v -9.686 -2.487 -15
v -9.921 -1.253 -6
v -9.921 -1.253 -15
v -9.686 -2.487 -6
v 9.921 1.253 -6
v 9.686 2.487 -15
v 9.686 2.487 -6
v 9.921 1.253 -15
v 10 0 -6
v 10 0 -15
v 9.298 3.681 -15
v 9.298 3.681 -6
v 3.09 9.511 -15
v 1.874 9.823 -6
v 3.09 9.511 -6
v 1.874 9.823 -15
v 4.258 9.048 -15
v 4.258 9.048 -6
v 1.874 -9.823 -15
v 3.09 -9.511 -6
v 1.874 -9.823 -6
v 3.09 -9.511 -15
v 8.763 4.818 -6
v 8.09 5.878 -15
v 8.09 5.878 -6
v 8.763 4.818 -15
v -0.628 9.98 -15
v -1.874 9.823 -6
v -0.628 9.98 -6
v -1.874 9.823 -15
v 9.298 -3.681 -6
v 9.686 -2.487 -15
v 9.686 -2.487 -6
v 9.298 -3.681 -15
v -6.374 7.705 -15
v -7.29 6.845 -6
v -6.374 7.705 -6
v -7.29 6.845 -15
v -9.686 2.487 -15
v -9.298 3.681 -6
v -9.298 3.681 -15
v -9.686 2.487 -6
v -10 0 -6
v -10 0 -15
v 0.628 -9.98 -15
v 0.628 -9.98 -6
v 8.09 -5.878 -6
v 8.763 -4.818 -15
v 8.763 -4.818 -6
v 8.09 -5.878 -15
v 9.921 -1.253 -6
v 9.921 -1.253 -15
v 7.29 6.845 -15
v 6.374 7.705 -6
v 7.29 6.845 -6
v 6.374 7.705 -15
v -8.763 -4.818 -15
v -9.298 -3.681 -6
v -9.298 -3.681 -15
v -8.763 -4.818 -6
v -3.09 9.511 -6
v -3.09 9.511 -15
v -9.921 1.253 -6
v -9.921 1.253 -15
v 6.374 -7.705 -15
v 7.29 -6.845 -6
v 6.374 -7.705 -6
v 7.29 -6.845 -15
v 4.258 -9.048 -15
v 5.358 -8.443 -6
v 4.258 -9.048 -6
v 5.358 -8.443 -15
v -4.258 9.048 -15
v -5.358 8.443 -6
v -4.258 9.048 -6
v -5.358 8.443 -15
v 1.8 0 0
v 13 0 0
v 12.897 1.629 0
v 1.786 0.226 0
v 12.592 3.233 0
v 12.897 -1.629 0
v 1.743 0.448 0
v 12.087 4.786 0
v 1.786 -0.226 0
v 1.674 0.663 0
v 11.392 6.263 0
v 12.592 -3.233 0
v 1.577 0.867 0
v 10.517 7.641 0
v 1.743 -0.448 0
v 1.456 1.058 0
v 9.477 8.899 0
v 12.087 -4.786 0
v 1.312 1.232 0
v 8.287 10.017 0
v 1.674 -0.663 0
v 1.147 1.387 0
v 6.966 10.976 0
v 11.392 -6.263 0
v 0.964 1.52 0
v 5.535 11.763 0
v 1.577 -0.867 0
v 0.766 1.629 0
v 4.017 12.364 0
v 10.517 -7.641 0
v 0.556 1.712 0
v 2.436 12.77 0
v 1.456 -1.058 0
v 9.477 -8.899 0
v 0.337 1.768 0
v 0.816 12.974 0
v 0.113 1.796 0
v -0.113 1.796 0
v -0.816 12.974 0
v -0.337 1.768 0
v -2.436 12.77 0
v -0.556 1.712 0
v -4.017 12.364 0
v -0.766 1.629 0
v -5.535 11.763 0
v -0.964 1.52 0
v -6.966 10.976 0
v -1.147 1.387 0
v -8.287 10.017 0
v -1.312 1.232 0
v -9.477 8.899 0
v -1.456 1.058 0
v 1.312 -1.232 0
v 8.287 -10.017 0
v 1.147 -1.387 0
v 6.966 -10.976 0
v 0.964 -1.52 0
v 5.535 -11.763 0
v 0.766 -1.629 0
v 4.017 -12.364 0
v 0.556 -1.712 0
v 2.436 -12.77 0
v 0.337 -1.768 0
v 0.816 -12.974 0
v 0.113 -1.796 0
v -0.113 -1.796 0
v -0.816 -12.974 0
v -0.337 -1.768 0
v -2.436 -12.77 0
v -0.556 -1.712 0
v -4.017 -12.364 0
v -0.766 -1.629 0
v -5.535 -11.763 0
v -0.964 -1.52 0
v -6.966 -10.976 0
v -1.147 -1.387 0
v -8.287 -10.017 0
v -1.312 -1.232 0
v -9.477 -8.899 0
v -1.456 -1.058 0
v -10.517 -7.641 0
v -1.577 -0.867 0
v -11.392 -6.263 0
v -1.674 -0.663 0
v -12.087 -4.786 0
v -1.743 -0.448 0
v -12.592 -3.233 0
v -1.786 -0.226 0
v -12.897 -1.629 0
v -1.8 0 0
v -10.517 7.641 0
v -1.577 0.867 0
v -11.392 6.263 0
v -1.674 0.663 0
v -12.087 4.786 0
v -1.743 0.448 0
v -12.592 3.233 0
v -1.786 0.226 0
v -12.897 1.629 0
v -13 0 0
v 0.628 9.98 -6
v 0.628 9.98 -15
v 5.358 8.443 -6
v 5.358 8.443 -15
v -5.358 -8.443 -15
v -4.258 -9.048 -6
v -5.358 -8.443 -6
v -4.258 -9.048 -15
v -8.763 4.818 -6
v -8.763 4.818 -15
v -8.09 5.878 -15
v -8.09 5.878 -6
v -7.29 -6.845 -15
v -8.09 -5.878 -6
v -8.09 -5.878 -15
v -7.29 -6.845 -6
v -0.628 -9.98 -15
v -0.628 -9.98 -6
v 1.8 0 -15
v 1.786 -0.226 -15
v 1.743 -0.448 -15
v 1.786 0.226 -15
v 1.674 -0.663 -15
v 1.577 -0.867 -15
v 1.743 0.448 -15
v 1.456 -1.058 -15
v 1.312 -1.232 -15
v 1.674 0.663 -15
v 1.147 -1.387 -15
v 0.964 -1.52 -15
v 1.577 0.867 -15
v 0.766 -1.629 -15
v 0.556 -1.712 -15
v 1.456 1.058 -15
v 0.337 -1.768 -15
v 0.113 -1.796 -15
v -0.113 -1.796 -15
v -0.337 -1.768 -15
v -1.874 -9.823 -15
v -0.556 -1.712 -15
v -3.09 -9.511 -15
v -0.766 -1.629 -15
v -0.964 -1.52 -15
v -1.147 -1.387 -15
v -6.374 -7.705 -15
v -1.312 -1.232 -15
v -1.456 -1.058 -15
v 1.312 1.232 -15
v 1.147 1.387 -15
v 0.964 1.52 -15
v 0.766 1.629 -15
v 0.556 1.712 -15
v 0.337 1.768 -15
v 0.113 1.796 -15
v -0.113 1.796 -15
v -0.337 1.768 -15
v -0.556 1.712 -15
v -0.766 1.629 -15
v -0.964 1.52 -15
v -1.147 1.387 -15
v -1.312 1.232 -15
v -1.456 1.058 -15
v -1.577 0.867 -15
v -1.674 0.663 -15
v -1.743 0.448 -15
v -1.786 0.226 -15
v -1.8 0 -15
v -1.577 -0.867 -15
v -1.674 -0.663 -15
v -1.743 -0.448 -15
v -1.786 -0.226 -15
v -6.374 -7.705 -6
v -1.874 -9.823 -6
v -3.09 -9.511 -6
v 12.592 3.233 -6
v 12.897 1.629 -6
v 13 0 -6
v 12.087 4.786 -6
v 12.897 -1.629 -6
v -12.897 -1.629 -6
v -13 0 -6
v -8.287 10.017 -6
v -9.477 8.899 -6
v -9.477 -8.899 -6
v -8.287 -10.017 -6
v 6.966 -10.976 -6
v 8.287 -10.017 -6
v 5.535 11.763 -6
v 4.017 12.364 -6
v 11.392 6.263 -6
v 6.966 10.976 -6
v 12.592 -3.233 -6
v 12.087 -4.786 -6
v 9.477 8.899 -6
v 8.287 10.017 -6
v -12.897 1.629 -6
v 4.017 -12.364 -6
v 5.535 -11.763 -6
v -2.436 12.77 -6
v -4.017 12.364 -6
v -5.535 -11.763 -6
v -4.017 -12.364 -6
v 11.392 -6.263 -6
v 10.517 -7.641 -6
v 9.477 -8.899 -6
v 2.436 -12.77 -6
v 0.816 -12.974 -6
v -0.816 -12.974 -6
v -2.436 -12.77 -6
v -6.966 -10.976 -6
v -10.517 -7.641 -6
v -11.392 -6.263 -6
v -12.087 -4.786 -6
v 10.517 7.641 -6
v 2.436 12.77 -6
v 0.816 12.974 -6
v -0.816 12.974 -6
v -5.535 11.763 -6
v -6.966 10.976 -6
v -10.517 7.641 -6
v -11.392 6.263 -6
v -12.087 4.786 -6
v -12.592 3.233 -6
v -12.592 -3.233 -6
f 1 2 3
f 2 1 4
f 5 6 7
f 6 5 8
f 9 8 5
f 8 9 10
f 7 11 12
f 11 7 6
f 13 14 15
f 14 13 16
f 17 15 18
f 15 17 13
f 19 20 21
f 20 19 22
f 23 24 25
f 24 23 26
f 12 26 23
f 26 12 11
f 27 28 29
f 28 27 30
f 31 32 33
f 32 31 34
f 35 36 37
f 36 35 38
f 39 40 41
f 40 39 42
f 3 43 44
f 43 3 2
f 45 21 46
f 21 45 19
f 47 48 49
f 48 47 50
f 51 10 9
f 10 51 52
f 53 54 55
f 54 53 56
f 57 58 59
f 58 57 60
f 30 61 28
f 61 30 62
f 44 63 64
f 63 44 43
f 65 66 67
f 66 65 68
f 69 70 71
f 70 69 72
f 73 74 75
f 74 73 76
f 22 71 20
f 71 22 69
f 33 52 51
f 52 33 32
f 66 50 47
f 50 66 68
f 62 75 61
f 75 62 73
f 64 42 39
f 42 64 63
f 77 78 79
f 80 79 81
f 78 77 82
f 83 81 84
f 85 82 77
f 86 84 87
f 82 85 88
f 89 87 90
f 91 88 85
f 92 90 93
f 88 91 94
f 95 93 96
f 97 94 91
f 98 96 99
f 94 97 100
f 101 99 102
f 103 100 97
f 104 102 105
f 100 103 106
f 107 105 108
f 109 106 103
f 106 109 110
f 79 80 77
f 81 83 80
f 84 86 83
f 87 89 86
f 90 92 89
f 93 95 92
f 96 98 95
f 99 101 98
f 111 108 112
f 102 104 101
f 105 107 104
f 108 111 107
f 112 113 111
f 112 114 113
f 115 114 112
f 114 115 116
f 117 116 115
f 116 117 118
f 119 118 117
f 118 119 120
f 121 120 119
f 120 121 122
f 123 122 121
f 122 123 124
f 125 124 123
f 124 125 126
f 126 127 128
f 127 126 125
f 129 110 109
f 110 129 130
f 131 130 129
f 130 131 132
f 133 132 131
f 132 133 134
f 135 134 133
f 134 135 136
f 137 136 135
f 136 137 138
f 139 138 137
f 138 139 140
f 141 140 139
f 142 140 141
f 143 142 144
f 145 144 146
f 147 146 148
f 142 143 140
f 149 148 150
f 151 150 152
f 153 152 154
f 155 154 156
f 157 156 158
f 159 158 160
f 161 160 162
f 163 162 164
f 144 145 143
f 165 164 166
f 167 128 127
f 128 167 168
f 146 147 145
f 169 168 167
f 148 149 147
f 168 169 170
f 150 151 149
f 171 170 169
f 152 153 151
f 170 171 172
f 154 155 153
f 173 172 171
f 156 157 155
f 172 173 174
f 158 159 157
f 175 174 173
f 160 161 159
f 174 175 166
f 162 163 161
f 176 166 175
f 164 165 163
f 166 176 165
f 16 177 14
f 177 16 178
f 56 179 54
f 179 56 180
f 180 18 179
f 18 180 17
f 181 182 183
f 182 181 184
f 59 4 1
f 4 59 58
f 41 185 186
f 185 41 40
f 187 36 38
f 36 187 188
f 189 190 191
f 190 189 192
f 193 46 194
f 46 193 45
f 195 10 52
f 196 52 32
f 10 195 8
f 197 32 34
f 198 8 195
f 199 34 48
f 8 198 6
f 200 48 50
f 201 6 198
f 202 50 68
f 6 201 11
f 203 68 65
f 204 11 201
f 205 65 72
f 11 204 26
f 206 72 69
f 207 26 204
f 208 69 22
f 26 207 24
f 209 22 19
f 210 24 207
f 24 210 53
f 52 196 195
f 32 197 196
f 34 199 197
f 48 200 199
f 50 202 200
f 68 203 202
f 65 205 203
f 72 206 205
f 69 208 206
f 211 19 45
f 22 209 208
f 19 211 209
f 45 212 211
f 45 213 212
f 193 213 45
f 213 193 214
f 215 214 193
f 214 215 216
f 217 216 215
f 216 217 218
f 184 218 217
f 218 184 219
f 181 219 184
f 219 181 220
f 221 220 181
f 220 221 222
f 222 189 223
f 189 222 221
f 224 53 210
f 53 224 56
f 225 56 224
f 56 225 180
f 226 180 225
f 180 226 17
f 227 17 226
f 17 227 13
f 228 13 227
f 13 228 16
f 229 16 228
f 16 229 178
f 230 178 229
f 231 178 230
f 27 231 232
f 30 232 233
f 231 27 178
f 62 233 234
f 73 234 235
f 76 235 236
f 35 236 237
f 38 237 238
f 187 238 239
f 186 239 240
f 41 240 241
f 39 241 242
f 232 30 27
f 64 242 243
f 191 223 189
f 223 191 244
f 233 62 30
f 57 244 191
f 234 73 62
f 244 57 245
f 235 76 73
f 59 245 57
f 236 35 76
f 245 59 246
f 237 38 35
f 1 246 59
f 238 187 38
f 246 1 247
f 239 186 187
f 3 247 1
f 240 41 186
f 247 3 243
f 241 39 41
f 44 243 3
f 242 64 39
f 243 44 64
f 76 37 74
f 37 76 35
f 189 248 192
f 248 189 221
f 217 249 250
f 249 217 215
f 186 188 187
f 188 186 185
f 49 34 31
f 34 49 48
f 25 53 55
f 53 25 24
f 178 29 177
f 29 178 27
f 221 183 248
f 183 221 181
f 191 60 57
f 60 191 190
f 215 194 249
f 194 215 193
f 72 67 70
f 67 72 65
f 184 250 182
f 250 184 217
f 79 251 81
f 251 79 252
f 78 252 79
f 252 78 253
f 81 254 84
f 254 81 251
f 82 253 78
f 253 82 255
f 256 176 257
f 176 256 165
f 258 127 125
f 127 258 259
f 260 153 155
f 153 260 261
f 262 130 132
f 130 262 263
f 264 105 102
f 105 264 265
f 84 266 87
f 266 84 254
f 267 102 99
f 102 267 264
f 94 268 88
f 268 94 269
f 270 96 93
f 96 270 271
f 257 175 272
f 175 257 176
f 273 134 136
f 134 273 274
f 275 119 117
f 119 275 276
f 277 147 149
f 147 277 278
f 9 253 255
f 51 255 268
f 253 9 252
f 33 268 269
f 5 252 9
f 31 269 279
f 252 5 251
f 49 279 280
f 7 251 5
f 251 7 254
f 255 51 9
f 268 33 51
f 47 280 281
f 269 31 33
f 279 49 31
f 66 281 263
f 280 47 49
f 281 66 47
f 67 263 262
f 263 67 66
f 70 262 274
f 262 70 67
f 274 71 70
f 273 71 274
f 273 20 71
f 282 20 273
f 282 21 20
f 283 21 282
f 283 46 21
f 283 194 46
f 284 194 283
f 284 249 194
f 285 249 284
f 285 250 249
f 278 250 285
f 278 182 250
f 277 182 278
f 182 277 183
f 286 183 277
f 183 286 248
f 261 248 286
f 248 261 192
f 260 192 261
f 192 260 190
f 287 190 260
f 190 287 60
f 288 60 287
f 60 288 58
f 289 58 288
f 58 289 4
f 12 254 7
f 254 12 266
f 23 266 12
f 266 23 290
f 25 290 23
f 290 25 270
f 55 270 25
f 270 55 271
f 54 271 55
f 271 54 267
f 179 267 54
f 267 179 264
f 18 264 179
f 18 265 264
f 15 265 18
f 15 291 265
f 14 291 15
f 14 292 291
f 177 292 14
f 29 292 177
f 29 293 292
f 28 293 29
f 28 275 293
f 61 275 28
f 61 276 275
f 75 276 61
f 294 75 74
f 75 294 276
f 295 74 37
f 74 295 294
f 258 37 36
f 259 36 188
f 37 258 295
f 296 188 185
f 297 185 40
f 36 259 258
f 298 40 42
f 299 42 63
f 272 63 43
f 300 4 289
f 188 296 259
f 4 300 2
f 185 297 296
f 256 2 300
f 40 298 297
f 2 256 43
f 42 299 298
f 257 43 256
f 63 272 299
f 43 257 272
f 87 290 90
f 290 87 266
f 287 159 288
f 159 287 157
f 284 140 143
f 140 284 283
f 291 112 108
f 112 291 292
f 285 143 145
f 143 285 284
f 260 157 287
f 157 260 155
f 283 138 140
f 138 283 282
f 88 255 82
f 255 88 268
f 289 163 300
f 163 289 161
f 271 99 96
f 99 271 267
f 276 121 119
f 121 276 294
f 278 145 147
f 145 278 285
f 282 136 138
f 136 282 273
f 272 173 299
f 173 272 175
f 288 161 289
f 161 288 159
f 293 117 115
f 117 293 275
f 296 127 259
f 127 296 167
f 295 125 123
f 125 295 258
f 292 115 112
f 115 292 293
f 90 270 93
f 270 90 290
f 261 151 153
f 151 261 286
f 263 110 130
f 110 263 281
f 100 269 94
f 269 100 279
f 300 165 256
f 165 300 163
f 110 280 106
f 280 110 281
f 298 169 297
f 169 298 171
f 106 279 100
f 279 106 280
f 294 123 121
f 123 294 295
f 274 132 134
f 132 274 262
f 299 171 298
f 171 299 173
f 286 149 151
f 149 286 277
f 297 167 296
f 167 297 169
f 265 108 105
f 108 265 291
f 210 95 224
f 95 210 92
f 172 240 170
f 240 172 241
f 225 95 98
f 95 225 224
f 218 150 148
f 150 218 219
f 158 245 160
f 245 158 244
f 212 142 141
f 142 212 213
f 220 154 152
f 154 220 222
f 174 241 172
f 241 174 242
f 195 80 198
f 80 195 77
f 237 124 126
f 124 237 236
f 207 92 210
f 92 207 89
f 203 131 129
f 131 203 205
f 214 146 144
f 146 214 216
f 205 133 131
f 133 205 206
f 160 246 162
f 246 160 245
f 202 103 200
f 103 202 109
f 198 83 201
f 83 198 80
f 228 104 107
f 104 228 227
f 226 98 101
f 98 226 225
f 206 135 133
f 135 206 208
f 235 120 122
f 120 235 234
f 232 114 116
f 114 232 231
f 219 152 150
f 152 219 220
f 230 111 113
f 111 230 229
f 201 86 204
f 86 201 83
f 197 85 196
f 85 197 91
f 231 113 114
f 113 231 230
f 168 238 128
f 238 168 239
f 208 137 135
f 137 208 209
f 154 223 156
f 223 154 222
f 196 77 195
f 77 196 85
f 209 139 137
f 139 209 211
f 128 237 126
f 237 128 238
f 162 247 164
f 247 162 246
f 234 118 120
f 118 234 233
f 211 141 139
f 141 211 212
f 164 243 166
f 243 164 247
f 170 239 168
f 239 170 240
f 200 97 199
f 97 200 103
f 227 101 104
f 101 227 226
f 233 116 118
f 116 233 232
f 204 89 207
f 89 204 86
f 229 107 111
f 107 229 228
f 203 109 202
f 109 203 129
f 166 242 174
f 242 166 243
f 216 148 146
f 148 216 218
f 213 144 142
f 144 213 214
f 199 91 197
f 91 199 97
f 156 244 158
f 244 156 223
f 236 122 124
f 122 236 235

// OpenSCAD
$fn = 50;


difference() {
	union() {
		translate(v = [0, 0, -15.0000000000]) {
			cylinder(h = 15, r = 10.0000000000);
		}
		translate(v = [0, 0, -6.0000000000]) {
			cylinder(h = 6, r = 13.0000000000);
		}
	}
	union() {
		#translate(v = [0, 0, -15]) {
			cylinder(h = 15, r = 1.8000000000);
		}
	}
}
